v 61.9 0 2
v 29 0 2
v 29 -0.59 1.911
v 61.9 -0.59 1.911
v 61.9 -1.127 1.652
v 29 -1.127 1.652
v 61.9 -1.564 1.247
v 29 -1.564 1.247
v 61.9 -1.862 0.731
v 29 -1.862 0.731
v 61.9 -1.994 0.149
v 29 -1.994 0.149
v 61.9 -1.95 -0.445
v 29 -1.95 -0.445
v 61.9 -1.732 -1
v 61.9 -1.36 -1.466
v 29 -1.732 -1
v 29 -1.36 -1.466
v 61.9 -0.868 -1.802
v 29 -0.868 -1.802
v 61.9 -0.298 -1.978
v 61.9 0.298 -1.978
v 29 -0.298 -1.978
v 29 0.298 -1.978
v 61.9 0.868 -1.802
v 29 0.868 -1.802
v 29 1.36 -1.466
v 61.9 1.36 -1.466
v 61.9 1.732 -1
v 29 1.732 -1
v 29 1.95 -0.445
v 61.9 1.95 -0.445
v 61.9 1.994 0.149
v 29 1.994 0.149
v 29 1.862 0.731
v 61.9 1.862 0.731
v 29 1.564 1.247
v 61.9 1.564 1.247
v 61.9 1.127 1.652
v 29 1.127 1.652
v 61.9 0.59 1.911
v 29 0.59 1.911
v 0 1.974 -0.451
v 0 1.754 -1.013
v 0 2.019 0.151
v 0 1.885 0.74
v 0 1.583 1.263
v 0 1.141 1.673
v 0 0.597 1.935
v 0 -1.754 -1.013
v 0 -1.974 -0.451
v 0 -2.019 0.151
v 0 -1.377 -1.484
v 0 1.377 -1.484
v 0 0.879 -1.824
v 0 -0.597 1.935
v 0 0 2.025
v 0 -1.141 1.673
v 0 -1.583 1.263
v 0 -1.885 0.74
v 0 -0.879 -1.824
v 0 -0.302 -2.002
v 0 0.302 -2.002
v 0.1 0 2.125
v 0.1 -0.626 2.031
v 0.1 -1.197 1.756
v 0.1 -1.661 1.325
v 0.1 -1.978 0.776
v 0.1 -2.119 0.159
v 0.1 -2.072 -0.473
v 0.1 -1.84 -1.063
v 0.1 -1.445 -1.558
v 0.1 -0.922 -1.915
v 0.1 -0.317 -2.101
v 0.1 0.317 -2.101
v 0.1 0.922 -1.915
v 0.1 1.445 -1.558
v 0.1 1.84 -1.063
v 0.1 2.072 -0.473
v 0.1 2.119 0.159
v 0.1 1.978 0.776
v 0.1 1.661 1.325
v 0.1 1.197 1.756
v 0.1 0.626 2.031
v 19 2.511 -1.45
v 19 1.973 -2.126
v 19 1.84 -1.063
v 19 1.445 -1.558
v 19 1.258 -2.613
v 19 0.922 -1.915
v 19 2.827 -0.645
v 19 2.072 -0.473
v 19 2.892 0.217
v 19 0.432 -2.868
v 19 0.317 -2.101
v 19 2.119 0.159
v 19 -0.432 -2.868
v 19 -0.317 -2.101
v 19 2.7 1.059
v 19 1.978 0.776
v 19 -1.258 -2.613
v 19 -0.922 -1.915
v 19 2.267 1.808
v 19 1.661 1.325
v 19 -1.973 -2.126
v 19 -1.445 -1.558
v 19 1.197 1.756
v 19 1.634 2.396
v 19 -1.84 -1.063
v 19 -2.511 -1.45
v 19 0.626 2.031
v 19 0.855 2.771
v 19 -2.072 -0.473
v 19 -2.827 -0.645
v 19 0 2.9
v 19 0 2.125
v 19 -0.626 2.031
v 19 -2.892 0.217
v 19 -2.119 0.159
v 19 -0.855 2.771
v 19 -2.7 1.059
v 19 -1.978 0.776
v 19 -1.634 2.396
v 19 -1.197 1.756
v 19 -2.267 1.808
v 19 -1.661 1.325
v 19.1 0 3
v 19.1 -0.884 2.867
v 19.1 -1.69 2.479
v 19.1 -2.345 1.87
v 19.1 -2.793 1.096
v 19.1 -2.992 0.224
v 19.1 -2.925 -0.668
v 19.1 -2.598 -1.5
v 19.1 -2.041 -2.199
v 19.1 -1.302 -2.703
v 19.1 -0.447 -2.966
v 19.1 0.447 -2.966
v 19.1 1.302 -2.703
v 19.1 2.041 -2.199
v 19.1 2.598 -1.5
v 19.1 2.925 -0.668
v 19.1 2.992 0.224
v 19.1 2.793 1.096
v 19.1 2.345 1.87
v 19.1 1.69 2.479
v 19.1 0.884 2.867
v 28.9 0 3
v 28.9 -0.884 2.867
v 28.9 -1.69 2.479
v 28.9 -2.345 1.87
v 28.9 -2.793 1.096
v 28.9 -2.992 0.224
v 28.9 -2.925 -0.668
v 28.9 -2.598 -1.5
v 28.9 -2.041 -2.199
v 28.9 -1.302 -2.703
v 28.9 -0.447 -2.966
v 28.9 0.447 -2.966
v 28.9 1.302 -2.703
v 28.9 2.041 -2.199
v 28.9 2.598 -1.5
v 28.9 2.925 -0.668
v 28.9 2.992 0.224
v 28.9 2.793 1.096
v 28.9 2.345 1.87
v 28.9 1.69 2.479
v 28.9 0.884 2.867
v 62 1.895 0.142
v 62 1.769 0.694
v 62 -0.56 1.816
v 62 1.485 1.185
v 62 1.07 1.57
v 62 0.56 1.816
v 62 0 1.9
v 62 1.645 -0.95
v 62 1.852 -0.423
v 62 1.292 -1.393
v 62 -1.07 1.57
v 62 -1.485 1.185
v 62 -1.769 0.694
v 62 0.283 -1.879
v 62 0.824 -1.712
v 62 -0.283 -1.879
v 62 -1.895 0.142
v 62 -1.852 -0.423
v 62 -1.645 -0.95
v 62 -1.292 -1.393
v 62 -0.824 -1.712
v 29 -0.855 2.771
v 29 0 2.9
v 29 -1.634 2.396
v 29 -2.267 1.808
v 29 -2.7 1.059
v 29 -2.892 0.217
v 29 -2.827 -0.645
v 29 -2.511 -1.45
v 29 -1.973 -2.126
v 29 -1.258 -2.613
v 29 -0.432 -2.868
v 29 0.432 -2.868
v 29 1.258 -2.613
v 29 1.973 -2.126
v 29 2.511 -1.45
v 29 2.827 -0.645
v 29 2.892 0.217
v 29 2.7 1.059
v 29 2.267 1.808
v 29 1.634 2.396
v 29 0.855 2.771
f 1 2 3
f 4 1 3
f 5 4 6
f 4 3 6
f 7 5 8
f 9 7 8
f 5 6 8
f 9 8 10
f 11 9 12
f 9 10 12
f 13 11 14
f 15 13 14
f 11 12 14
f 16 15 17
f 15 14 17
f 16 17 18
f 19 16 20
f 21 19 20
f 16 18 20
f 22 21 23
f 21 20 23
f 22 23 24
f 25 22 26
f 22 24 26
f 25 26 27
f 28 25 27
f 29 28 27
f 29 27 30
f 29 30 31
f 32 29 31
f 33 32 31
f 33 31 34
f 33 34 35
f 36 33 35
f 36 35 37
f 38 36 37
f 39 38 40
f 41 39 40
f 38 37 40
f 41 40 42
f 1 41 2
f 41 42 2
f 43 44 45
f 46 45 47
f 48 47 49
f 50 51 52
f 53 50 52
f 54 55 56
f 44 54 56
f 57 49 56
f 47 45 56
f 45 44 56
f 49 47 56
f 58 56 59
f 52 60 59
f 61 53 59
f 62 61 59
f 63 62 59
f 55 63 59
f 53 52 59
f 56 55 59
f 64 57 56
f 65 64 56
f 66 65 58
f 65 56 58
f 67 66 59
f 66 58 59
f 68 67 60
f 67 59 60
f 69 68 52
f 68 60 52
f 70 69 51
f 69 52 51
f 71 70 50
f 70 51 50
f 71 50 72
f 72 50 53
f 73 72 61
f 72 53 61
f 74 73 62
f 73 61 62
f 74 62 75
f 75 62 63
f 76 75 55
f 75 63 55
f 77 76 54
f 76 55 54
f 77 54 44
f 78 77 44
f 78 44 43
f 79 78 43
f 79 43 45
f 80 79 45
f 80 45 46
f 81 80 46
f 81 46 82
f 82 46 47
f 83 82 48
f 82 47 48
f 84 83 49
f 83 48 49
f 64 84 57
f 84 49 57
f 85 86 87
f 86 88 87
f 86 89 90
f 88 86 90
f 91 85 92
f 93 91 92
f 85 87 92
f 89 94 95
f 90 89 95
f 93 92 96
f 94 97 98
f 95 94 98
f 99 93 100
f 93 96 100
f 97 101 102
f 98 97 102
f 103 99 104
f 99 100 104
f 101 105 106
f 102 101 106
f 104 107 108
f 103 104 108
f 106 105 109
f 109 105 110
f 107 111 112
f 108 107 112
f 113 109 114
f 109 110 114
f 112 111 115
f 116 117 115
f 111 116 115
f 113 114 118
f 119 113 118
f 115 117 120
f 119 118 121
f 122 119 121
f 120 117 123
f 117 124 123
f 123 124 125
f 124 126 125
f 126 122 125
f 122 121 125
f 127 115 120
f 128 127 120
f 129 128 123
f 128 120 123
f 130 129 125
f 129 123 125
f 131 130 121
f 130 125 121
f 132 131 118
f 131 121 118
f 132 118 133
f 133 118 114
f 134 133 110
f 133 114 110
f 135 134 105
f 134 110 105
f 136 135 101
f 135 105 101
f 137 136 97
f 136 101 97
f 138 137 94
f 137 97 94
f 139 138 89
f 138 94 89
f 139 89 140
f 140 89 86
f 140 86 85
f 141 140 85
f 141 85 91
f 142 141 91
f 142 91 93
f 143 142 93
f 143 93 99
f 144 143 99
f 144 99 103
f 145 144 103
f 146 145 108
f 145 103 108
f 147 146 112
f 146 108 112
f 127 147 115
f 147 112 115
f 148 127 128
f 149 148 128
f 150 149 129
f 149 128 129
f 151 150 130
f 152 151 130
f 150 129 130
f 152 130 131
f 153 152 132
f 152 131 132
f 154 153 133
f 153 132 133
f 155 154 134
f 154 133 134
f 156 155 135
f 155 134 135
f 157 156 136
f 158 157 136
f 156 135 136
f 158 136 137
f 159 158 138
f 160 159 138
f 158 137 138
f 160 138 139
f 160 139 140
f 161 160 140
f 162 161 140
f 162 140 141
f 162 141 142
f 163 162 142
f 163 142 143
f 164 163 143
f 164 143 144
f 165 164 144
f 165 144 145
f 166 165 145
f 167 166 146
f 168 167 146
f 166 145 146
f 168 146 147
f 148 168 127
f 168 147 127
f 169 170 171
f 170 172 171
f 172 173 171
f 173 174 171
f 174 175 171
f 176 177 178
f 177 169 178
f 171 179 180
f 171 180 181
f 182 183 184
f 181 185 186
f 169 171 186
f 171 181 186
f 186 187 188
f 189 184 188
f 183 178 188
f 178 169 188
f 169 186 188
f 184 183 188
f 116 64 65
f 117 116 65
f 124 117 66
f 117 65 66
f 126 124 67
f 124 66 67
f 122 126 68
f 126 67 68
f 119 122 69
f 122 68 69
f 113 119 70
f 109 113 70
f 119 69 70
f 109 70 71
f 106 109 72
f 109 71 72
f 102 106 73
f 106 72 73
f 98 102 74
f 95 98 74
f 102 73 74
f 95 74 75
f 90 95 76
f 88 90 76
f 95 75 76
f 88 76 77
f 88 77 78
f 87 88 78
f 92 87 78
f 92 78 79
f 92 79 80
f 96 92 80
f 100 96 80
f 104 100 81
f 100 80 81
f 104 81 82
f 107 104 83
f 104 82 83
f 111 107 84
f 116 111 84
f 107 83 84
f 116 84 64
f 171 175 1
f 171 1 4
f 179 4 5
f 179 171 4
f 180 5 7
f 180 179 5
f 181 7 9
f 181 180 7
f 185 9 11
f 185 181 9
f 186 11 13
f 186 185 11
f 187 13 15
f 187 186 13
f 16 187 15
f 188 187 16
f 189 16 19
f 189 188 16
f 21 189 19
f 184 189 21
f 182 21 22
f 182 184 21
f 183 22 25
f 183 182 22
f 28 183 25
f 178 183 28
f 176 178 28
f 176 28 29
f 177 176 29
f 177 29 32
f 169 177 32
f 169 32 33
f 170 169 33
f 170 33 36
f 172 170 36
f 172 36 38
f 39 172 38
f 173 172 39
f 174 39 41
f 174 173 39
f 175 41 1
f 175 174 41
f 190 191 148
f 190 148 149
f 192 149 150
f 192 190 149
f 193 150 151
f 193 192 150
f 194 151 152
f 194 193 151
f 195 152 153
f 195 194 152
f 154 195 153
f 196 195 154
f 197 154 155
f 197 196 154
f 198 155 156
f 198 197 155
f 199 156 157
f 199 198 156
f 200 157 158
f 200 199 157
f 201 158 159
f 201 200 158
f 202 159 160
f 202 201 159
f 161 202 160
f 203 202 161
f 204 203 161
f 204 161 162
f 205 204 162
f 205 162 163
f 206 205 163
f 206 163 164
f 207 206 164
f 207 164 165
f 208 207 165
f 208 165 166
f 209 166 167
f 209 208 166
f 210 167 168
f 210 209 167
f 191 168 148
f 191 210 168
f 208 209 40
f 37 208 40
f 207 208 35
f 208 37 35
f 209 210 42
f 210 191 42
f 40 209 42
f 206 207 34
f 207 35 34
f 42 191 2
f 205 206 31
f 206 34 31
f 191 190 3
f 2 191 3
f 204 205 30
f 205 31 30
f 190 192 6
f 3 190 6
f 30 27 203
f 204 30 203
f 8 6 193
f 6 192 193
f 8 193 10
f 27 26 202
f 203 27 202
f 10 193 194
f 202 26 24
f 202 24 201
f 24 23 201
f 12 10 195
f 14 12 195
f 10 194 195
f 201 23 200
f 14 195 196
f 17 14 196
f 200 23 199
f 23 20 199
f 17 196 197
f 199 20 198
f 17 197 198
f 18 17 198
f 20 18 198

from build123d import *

# Parameters (mm, degrees)
CHAMFER1_SIZE = 0.1
CHAMFER3_SIZE = 0.1
CHAMFER4_SIZE = 0.1
CHAMFER5_SIZE = 0.1


with BuildPart() as part:
    # Sketch1 → Revolve1 (revolve)
    with BuildSketch(Plane.XY, mode=Mode.PRIVATE) as revolve1_sk:
        Polygon((0, 0), (29, 0), (62, 0), (62, 2), (29, 2), (29, 3), (19, 3), (19, 2.125), (0, 2.125), align=None)
    revolve(revolve1_sk.sketch.rotate(Axis((0, 0, 0), (1, 0, 0)), 90), axis=Axis((0, 0, 0), (1, 0, 0)))

    # Chamfer1
    chamfer1_edges = [part.edges().sort_by_distance(p)[0] for p in [
        (0, 0, -2.125),
    ]]
    chamfer(chamfer1_edges, length=CHAMFER1_SIZE)

    # Chamfer3
    chamfer3_edges = [part.edges().sort_by_distance(p)[0] for p in [
        (29, 0, -3),
    ]]
    chamfer(chamfer3_edges, length=CHAMFER3_SIZE)

    # Chamfer4
    chamfer4_edges = [part.edges().sort_by_distance(p)[0] for p in [
        (62, 0, -2),
    ]]
    chamfer(chamfer4_edges, length=CHAMFER4_SIZE)

    # Chamfer5
    chamfer5_edges = [part.edges().sort_by_distance(p)[0] for p in [
        (19, 0, -3),
    ]]
    chamfer(chamfer5_edges, length=CHAMFER5_SIZE)


solid = part.part
